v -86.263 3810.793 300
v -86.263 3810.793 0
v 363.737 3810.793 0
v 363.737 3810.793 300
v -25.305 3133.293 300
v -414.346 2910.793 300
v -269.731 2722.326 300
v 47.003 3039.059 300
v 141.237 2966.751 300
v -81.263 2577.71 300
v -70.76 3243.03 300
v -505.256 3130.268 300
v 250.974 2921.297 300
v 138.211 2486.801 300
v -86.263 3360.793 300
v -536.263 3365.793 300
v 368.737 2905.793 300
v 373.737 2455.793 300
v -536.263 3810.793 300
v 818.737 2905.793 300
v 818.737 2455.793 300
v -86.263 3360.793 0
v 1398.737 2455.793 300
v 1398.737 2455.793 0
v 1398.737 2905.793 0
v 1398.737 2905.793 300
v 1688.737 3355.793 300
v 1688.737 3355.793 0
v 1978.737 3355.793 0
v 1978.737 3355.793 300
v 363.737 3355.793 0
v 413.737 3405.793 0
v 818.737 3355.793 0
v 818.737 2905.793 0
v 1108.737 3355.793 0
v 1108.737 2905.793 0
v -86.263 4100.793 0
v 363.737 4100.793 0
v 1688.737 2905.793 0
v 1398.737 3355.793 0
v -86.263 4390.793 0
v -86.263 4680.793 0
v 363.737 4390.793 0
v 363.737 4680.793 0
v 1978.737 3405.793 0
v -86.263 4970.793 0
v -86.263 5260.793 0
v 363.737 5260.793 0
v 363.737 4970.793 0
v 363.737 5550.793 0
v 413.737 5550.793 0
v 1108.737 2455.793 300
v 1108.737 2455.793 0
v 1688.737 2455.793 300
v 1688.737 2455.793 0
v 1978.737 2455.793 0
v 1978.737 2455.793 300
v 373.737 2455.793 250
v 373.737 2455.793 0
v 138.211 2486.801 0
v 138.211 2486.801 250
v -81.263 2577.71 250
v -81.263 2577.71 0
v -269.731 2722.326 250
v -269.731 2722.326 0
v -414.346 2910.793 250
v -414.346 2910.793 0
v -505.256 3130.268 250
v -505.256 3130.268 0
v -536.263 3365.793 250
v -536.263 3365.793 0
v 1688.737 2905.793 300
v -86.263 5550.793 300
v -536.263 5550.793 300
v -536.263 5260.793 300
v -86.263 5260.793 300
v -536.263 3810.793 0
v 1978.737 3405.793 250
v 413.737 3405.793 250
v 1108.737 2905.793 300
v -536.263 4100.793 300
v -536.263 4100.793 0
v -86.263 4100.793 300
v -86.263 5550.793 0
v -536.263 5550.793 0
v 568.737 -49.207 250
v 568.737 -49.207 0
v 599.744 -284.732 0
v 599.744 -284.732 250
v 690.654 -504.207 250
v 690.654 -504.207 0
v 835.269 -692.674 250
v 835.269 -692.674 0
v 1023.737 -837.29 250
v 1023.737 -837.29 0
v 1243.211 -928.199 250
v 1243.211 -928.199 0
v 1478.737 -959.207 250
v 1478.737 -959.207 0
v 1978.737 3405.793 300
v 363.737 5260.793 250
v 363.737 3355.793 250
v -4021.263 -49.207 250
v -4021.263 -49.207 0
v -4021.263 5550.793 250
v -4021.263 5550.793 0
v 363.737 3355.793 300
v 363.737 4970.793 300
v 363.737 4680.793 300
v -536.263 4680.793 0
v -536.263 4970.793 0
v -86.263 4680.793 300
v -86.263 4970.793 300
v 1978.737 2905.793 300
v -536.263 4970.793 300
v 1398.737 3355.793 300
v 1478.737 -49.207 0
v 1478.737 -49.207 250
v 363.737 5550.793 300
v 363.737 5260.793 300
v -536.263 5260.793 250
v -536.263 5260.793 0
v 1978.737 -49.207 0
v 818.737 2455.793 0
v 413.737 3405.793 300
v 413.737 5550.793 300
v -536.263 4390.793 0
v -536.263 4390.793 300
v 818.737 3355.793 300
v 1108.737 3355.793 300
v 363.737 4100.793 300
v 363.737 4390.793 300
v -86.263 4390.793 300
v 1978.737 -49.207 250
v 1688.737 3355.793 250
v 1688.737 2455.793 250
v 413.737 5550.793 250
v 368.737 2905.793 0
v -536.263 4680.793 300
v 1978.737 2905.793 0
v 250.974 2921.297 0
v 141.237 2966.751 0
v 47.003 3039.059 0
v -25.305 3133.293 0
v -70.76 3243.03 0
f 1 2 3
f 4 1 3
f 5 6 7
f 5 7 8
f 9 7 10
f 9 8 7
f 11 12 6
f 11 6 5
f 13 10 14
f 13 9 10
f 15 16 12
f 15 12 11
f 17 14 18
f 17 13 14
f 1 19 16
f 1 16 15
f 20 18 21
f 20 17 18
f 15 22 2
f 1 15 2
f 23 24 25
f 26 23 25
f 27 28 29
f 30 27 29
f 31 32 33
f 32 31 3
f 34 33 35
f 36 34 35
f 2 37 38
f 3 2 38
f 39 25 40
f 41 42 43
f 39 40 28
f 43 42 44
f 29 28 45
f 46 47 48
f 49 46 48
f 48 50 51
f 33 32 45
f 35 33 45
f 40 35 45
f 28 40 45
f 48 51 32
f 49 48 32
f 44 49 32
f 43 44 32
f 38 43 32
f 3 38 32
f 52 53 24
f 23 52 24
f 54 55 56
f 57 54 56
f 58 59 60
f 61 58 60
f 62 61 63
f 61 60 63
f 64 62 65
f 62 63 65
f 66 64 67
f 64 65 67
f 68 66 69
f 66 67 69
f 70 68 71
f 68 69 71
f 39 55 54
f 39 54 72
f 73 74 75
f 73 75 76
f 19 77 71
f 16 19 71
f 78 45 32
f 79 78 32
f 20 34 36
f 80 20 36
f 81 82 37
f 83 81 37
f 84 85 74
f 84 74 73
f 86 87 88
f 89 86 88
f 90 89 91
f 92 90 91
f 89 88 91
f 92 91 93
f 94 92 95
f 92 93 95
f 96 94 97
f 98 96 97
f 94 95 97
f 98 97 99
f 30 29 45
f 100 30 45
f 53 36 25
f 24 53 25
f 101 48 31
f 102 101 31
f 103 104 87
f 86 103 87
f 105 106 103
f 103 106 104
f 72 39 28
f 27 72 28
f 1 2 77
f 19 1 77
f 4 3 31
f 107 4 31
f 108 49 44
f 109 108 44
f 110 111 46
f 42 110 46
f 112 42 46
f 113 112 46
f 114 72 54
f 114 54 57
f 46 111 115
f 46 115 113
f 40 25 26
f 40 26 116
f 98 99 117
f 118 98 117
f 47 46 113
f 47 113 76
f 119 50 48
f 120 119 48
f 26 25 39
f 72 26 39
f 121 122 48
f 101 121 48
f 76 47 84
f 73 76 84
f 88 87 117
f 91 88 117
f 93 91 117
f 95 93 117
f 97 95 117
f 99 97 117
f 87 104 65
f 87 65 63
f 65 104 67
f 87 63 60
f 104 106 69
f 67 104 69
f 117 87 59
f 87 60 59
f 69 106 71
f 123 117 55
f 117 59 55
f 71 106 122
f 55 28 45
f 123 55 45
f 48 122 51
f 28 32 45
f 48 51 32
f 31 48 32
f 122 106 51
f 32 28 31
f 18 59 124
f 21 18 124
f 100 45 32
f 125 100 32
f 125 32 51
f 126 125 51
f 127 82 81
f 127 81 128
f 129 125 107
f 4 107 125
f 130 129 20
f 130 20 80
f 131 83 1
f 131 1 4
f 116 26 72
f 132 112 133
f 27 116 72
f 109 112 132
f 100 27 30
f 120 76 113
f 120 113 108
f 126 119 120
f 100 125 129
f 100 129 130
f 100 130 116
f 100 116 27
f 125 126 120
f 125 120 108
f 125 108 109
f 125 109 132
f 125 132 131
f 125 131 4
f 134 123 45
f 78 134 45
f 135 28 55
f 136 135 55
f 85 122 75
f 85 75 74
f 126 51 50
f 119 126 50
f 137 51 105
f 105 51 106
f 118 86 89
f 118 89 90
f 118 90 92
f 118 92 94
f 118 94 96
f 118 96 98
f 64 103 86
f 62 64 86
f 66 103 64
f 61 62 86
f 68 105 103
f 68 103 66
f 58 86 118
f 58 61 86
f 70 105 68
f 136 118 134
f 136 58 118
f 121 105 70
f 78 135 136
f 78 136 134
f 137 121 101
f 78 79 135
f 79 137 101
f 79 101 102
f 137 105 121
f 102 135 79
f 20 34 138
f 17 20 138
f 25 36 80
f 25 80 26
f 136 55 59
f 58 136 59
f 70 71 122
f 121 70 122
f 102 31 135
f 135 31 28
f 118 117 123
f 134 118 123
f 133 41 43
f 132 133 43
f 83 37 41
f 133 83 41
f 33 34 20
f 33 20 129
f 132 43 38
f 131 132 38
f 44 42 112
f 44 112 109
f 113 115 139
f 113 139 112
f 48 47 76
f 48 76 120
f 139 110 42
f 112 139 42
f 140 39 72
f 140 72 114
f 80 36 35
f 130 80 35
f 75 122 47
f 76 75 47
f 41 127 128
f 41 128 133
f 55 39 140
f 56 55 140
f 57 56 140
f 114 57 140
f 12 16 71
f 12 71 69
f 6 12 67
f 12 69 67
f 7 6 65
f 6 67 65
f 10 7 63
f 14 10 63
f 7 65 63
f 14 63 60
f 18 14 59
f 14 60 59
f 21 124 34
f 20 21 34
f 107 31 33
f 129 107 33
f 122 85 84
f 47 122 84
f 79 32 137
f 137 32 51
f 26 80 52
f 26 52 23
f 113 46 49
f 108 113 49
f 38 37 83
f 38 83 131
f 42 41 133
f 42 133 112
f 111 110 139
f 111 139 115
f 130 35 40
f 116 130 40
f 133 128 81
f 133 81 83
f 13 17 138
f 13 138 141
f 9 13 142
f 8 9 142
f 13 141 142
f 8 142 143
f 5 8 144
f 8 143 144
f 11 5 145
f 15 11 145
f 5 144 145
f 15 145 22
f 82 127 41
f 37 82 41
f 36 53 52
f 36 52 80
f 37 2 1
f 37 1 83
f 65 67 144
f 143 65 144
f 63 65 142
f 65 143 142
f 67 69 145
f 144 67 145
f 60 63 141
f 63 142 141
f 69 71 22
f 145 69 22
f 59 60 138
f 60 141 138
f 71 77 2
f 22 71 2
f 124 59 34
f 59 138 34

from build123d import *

# Parameters (mm, degrees)
F1_DEPTH = 300
F0_W     = 450
F0_H     = 290
F0_W_2   = 290
F0_H_2   = 450
F2_DEPTH = 250


with BuildPart() as f1:
    # F0 (on Top) → F1 (new body)
    with BuildSketch(Plane.XY):
        with BuildLine():
            Line((-86.2633565673, 3810.7930092514), (-536.2633565673, 3810.7930092514))
            Line((-536.2633565673, 3810.7930092514), (-536.2633565673, 3365.7930092514))
            ThreePointArc((-536.2633565673, 3365.7930092514), (-269.730527447, 2722.3258383716), (373.7366434327, 2455.7930092514))
            Line((373.7366434327, 2455.7930092514), (818.7366434327, 2455.7930092514))
            Line((818.7366434327, 2455.7930092514), (818.7366434327, 2905.7930092514))
            Line((818.7366434327, 2905.7930092514), (368.7366434327, 2905.7930092514))
            ThreePointArc((368.7366434327, 2905.7930092514), (47.0030579929, 3039.0594238115), (-86.2633565673, 3360.7930092514))
            Line((-86.2633565673, 3360.7930092514), (-86.2633565673, 3810.7930092514))
        make_face()
    extrude(amount=F1_DEPTH)


with BuildPart() as f1b:
    # F0 (on Top) → F1, piece 2 (new body)
    with BuildSketch(Plane.XY):
        Polygon((413.7366434327, 5550.7930092514), (363.7366434327, 5550.7930092514), (363.7366434327, 5260.7930092514), (363.7366434327, 4970.7930092514), (363.7366434327, 4680.7930092514), (363.7366434327, 4390.7930092514), (363.7366434327, 4100.7930092514), (363.7366434327, 3810.7930092514), (363.7366434327, 3355.7930092514), (818.7366434327, 3355.7930092514), (1108.7366434327, 3355.7930092514), (1398.7366434327, 3355.7930092514), (1688.7366434327, 3355.7930092514), (1978.7366434327, 3355.7930092514), (1978.7366434327, 3405.7930092514), (818.7366434327, 3405.7930092514), (413.7366434327, 3405.7930092514), (413.7366434327, 3810.7930092514), align=None)
        with Locations((138.7366434327, 5115.7930092514)):
            Rectangle(F0_W, F0_H)
        with Locations((138.7366434327, 4535.7930092514)):
            Rectangle(F0_W, F0_H)
        with Locations((138.7366434327, 3955.7930092514)):
            Rectangle(F0_W, F0_H)
        with Locations((963.7366434327, 3130.7930092514)):
            Rectangle(F0_W_2, F0_H_2)
        with Locations((1543.7366434327, 3130.7930092514)):
            Rectangle(F0_W_2, F0_H_2)
    extrude(amount=F1_DEPTH)


with BuildPart() as f1c:
    # F0 (on Top) → F1, piece 3 (new body)
    with BuildSketch(Plane.XY):
        with Locations((1253.7366434327, 2680.7930092514)):
            Rectangle(F0_W_2, F0_H_2)
    extrude(amount=F1_DEPTH)


with BuildPart() as f1d:
    # F0 (on Top) → F1, piece 4 (new body)
    with BuildSketch(Plane.XY):
        with Locations((-311.2633565673, 4245.7930092514)):
            Rectangle(F0_W, F0_H)
    extrude(amount=F1_DEPTH)


with BuildPart() as f1e:
    # F0 (on Top) → F1, piece 5 (new body)
    with BuildSketch(Plane.XY):
        with Locations((-311.2633565673, 5405.7930092514)):
            Rectangle(F0_W, F0_H)
    extrude(amount=F1_DEPTH)


with BuildPart() as f1f:
    # F0 (on Top) → F1, piece 6 (new body)
    with BuildSketch(Plane.XY):
        with Locations((1833.7366434327, 2680.7930092514)):
            Rectangle(F0_W_2, F0_H_2)
    extrude(amount=F1_DEPTH)


with BuildPart() as f1g:
    # F0 (on Top) → F1, piece 7 (new body)
    with BuildSketch(Plane.XY):
        with Locations((-311.2633565673, 4825.7930092514)):
            Rectangle(F0_W, F0_H)
    extrude(amount=F1_DEPTH)


with BuildPart() as f2:
    # F0 (on Top) → F2 (new body)
    with BuildSketch(Plane.XY):
        with BuildLine():
            Line((-4021.2633565673, 5550.7930092514), (-4021.2633565673, -49.2069907486))
            Line((-4021.2633565673, -49.2069907486), (568.7366434327, -49.2069907486))
            ThreePointArc((568.7366434327, -49.2069907486), (835.269472553, -692.6741616284), (1478.7366434327, -959.2069907486))
            Line((1478.7366434327, -959.2069907486), (1478.7366434327, -49.2069907486))
            Line((1478.7366434327, -49.2069907486), (1978.7366434327, -49.2069907486))
            Line((1978.7366434327, -49.2069907486), (1978.7366434327, 2455.7930092514))
            Line((1978.7366434327, 2455.7930092514), (1688.7366434327, 2455.7930092514))
            Line((1688.7366434327, 2455.7930092514), (1398.7366434327, 2455.7930092514))
            Line((1398.7366434327, 2455.7930092514), (1108.7366434327, 2455.7930092514))
            Line((1108.7366434327, 2455.7930092514), (818.7366434327, 2455.7930092514))
            Line((818.7366434327, 2455.7930092514), (373.7366434327, 2455.7930092514))
            ThreePointArc((373.7366434327, 2455.7930092514), (-269.730527447, 2722.3258383716), (-536.2633565673, 3365.7930092514))
            Line((-536.2633565673, 3365.7930092514), (-536.2633565673, 3810.7930092514))
            Line((-536.2633565673, 3810.7930092514), (-536.2633565673, 4100.7930092514))
            Line((-536.2633565673, 4100.7930092514), (-536.2633565673, 4390.7930092514))
            Line((-536.2633565673, 4390.7930092514), (-536.2633565673, 4680.7930092514))
            Line((-536.2633565673, 4680.7930092514), (-536.2633565673, 4970.7930092514))
            Line((-536.2633565673, 4970.7930092514), (-536.2633565673, 5260.7930092514))
            Line((-536.2633565673, 5260.7930092514), (-536.2633565673, 5550.7930092514))
            Line((-536.2633565673, 5550.7930092514), (-4021.2633565673, 5550.7930092514))
        make_face()
        with Locations((-311.2633565673, 5405.7930092514)):
            Rectangle(F0_W, F0_H)
        with Locations((138.7366434327, 5405.7930092514)):
            Rectangle(F0_W, F0_H)
        Polygon((413.7366434327, 5550.7930092514), (363.7366434327, 5550.7930092514), (363.7366434327, 5260.7930092514), (363.7366434327, 4970.7930092514), (363.7366434327, 4680.7930092514), (363.7366434327, 4390.7930092514), (363.7366434327, 4100.7930092514), (363.7366434327, 3810.7930092514), (363.7366434327, 3355.7930092514), (818.7366434327, 3355.7930092514), (1108.7366434327, 3355.7930092514), (1398.7366434327, 3355.7930092514), (1688.7366434327, 3355.7930092514), (1978.7366434327, 3355.7930092514), (1978.7366434327, 3405.7930092514), (818.7366434327, 3405.7930092514), (413.7366434327, 3405.7930092514), (413.7366434327, 3810.7930092514), align=None)
        with Locations((1833.7366434327, 2680.7930092514)):
            Rectangle(F0_W_2, F0_H_2)
        with Locations((1833.7366434327, 3130.7930092514)):
            Rectangle(F0_W_2, F0_H_2)
    extrude(amount=F2_DEPTH)


solid = Compound([f1.part, f1b.part, f1c.part, f1d.part, f1e.part, f1f.part, f1g.part, f2.part])
